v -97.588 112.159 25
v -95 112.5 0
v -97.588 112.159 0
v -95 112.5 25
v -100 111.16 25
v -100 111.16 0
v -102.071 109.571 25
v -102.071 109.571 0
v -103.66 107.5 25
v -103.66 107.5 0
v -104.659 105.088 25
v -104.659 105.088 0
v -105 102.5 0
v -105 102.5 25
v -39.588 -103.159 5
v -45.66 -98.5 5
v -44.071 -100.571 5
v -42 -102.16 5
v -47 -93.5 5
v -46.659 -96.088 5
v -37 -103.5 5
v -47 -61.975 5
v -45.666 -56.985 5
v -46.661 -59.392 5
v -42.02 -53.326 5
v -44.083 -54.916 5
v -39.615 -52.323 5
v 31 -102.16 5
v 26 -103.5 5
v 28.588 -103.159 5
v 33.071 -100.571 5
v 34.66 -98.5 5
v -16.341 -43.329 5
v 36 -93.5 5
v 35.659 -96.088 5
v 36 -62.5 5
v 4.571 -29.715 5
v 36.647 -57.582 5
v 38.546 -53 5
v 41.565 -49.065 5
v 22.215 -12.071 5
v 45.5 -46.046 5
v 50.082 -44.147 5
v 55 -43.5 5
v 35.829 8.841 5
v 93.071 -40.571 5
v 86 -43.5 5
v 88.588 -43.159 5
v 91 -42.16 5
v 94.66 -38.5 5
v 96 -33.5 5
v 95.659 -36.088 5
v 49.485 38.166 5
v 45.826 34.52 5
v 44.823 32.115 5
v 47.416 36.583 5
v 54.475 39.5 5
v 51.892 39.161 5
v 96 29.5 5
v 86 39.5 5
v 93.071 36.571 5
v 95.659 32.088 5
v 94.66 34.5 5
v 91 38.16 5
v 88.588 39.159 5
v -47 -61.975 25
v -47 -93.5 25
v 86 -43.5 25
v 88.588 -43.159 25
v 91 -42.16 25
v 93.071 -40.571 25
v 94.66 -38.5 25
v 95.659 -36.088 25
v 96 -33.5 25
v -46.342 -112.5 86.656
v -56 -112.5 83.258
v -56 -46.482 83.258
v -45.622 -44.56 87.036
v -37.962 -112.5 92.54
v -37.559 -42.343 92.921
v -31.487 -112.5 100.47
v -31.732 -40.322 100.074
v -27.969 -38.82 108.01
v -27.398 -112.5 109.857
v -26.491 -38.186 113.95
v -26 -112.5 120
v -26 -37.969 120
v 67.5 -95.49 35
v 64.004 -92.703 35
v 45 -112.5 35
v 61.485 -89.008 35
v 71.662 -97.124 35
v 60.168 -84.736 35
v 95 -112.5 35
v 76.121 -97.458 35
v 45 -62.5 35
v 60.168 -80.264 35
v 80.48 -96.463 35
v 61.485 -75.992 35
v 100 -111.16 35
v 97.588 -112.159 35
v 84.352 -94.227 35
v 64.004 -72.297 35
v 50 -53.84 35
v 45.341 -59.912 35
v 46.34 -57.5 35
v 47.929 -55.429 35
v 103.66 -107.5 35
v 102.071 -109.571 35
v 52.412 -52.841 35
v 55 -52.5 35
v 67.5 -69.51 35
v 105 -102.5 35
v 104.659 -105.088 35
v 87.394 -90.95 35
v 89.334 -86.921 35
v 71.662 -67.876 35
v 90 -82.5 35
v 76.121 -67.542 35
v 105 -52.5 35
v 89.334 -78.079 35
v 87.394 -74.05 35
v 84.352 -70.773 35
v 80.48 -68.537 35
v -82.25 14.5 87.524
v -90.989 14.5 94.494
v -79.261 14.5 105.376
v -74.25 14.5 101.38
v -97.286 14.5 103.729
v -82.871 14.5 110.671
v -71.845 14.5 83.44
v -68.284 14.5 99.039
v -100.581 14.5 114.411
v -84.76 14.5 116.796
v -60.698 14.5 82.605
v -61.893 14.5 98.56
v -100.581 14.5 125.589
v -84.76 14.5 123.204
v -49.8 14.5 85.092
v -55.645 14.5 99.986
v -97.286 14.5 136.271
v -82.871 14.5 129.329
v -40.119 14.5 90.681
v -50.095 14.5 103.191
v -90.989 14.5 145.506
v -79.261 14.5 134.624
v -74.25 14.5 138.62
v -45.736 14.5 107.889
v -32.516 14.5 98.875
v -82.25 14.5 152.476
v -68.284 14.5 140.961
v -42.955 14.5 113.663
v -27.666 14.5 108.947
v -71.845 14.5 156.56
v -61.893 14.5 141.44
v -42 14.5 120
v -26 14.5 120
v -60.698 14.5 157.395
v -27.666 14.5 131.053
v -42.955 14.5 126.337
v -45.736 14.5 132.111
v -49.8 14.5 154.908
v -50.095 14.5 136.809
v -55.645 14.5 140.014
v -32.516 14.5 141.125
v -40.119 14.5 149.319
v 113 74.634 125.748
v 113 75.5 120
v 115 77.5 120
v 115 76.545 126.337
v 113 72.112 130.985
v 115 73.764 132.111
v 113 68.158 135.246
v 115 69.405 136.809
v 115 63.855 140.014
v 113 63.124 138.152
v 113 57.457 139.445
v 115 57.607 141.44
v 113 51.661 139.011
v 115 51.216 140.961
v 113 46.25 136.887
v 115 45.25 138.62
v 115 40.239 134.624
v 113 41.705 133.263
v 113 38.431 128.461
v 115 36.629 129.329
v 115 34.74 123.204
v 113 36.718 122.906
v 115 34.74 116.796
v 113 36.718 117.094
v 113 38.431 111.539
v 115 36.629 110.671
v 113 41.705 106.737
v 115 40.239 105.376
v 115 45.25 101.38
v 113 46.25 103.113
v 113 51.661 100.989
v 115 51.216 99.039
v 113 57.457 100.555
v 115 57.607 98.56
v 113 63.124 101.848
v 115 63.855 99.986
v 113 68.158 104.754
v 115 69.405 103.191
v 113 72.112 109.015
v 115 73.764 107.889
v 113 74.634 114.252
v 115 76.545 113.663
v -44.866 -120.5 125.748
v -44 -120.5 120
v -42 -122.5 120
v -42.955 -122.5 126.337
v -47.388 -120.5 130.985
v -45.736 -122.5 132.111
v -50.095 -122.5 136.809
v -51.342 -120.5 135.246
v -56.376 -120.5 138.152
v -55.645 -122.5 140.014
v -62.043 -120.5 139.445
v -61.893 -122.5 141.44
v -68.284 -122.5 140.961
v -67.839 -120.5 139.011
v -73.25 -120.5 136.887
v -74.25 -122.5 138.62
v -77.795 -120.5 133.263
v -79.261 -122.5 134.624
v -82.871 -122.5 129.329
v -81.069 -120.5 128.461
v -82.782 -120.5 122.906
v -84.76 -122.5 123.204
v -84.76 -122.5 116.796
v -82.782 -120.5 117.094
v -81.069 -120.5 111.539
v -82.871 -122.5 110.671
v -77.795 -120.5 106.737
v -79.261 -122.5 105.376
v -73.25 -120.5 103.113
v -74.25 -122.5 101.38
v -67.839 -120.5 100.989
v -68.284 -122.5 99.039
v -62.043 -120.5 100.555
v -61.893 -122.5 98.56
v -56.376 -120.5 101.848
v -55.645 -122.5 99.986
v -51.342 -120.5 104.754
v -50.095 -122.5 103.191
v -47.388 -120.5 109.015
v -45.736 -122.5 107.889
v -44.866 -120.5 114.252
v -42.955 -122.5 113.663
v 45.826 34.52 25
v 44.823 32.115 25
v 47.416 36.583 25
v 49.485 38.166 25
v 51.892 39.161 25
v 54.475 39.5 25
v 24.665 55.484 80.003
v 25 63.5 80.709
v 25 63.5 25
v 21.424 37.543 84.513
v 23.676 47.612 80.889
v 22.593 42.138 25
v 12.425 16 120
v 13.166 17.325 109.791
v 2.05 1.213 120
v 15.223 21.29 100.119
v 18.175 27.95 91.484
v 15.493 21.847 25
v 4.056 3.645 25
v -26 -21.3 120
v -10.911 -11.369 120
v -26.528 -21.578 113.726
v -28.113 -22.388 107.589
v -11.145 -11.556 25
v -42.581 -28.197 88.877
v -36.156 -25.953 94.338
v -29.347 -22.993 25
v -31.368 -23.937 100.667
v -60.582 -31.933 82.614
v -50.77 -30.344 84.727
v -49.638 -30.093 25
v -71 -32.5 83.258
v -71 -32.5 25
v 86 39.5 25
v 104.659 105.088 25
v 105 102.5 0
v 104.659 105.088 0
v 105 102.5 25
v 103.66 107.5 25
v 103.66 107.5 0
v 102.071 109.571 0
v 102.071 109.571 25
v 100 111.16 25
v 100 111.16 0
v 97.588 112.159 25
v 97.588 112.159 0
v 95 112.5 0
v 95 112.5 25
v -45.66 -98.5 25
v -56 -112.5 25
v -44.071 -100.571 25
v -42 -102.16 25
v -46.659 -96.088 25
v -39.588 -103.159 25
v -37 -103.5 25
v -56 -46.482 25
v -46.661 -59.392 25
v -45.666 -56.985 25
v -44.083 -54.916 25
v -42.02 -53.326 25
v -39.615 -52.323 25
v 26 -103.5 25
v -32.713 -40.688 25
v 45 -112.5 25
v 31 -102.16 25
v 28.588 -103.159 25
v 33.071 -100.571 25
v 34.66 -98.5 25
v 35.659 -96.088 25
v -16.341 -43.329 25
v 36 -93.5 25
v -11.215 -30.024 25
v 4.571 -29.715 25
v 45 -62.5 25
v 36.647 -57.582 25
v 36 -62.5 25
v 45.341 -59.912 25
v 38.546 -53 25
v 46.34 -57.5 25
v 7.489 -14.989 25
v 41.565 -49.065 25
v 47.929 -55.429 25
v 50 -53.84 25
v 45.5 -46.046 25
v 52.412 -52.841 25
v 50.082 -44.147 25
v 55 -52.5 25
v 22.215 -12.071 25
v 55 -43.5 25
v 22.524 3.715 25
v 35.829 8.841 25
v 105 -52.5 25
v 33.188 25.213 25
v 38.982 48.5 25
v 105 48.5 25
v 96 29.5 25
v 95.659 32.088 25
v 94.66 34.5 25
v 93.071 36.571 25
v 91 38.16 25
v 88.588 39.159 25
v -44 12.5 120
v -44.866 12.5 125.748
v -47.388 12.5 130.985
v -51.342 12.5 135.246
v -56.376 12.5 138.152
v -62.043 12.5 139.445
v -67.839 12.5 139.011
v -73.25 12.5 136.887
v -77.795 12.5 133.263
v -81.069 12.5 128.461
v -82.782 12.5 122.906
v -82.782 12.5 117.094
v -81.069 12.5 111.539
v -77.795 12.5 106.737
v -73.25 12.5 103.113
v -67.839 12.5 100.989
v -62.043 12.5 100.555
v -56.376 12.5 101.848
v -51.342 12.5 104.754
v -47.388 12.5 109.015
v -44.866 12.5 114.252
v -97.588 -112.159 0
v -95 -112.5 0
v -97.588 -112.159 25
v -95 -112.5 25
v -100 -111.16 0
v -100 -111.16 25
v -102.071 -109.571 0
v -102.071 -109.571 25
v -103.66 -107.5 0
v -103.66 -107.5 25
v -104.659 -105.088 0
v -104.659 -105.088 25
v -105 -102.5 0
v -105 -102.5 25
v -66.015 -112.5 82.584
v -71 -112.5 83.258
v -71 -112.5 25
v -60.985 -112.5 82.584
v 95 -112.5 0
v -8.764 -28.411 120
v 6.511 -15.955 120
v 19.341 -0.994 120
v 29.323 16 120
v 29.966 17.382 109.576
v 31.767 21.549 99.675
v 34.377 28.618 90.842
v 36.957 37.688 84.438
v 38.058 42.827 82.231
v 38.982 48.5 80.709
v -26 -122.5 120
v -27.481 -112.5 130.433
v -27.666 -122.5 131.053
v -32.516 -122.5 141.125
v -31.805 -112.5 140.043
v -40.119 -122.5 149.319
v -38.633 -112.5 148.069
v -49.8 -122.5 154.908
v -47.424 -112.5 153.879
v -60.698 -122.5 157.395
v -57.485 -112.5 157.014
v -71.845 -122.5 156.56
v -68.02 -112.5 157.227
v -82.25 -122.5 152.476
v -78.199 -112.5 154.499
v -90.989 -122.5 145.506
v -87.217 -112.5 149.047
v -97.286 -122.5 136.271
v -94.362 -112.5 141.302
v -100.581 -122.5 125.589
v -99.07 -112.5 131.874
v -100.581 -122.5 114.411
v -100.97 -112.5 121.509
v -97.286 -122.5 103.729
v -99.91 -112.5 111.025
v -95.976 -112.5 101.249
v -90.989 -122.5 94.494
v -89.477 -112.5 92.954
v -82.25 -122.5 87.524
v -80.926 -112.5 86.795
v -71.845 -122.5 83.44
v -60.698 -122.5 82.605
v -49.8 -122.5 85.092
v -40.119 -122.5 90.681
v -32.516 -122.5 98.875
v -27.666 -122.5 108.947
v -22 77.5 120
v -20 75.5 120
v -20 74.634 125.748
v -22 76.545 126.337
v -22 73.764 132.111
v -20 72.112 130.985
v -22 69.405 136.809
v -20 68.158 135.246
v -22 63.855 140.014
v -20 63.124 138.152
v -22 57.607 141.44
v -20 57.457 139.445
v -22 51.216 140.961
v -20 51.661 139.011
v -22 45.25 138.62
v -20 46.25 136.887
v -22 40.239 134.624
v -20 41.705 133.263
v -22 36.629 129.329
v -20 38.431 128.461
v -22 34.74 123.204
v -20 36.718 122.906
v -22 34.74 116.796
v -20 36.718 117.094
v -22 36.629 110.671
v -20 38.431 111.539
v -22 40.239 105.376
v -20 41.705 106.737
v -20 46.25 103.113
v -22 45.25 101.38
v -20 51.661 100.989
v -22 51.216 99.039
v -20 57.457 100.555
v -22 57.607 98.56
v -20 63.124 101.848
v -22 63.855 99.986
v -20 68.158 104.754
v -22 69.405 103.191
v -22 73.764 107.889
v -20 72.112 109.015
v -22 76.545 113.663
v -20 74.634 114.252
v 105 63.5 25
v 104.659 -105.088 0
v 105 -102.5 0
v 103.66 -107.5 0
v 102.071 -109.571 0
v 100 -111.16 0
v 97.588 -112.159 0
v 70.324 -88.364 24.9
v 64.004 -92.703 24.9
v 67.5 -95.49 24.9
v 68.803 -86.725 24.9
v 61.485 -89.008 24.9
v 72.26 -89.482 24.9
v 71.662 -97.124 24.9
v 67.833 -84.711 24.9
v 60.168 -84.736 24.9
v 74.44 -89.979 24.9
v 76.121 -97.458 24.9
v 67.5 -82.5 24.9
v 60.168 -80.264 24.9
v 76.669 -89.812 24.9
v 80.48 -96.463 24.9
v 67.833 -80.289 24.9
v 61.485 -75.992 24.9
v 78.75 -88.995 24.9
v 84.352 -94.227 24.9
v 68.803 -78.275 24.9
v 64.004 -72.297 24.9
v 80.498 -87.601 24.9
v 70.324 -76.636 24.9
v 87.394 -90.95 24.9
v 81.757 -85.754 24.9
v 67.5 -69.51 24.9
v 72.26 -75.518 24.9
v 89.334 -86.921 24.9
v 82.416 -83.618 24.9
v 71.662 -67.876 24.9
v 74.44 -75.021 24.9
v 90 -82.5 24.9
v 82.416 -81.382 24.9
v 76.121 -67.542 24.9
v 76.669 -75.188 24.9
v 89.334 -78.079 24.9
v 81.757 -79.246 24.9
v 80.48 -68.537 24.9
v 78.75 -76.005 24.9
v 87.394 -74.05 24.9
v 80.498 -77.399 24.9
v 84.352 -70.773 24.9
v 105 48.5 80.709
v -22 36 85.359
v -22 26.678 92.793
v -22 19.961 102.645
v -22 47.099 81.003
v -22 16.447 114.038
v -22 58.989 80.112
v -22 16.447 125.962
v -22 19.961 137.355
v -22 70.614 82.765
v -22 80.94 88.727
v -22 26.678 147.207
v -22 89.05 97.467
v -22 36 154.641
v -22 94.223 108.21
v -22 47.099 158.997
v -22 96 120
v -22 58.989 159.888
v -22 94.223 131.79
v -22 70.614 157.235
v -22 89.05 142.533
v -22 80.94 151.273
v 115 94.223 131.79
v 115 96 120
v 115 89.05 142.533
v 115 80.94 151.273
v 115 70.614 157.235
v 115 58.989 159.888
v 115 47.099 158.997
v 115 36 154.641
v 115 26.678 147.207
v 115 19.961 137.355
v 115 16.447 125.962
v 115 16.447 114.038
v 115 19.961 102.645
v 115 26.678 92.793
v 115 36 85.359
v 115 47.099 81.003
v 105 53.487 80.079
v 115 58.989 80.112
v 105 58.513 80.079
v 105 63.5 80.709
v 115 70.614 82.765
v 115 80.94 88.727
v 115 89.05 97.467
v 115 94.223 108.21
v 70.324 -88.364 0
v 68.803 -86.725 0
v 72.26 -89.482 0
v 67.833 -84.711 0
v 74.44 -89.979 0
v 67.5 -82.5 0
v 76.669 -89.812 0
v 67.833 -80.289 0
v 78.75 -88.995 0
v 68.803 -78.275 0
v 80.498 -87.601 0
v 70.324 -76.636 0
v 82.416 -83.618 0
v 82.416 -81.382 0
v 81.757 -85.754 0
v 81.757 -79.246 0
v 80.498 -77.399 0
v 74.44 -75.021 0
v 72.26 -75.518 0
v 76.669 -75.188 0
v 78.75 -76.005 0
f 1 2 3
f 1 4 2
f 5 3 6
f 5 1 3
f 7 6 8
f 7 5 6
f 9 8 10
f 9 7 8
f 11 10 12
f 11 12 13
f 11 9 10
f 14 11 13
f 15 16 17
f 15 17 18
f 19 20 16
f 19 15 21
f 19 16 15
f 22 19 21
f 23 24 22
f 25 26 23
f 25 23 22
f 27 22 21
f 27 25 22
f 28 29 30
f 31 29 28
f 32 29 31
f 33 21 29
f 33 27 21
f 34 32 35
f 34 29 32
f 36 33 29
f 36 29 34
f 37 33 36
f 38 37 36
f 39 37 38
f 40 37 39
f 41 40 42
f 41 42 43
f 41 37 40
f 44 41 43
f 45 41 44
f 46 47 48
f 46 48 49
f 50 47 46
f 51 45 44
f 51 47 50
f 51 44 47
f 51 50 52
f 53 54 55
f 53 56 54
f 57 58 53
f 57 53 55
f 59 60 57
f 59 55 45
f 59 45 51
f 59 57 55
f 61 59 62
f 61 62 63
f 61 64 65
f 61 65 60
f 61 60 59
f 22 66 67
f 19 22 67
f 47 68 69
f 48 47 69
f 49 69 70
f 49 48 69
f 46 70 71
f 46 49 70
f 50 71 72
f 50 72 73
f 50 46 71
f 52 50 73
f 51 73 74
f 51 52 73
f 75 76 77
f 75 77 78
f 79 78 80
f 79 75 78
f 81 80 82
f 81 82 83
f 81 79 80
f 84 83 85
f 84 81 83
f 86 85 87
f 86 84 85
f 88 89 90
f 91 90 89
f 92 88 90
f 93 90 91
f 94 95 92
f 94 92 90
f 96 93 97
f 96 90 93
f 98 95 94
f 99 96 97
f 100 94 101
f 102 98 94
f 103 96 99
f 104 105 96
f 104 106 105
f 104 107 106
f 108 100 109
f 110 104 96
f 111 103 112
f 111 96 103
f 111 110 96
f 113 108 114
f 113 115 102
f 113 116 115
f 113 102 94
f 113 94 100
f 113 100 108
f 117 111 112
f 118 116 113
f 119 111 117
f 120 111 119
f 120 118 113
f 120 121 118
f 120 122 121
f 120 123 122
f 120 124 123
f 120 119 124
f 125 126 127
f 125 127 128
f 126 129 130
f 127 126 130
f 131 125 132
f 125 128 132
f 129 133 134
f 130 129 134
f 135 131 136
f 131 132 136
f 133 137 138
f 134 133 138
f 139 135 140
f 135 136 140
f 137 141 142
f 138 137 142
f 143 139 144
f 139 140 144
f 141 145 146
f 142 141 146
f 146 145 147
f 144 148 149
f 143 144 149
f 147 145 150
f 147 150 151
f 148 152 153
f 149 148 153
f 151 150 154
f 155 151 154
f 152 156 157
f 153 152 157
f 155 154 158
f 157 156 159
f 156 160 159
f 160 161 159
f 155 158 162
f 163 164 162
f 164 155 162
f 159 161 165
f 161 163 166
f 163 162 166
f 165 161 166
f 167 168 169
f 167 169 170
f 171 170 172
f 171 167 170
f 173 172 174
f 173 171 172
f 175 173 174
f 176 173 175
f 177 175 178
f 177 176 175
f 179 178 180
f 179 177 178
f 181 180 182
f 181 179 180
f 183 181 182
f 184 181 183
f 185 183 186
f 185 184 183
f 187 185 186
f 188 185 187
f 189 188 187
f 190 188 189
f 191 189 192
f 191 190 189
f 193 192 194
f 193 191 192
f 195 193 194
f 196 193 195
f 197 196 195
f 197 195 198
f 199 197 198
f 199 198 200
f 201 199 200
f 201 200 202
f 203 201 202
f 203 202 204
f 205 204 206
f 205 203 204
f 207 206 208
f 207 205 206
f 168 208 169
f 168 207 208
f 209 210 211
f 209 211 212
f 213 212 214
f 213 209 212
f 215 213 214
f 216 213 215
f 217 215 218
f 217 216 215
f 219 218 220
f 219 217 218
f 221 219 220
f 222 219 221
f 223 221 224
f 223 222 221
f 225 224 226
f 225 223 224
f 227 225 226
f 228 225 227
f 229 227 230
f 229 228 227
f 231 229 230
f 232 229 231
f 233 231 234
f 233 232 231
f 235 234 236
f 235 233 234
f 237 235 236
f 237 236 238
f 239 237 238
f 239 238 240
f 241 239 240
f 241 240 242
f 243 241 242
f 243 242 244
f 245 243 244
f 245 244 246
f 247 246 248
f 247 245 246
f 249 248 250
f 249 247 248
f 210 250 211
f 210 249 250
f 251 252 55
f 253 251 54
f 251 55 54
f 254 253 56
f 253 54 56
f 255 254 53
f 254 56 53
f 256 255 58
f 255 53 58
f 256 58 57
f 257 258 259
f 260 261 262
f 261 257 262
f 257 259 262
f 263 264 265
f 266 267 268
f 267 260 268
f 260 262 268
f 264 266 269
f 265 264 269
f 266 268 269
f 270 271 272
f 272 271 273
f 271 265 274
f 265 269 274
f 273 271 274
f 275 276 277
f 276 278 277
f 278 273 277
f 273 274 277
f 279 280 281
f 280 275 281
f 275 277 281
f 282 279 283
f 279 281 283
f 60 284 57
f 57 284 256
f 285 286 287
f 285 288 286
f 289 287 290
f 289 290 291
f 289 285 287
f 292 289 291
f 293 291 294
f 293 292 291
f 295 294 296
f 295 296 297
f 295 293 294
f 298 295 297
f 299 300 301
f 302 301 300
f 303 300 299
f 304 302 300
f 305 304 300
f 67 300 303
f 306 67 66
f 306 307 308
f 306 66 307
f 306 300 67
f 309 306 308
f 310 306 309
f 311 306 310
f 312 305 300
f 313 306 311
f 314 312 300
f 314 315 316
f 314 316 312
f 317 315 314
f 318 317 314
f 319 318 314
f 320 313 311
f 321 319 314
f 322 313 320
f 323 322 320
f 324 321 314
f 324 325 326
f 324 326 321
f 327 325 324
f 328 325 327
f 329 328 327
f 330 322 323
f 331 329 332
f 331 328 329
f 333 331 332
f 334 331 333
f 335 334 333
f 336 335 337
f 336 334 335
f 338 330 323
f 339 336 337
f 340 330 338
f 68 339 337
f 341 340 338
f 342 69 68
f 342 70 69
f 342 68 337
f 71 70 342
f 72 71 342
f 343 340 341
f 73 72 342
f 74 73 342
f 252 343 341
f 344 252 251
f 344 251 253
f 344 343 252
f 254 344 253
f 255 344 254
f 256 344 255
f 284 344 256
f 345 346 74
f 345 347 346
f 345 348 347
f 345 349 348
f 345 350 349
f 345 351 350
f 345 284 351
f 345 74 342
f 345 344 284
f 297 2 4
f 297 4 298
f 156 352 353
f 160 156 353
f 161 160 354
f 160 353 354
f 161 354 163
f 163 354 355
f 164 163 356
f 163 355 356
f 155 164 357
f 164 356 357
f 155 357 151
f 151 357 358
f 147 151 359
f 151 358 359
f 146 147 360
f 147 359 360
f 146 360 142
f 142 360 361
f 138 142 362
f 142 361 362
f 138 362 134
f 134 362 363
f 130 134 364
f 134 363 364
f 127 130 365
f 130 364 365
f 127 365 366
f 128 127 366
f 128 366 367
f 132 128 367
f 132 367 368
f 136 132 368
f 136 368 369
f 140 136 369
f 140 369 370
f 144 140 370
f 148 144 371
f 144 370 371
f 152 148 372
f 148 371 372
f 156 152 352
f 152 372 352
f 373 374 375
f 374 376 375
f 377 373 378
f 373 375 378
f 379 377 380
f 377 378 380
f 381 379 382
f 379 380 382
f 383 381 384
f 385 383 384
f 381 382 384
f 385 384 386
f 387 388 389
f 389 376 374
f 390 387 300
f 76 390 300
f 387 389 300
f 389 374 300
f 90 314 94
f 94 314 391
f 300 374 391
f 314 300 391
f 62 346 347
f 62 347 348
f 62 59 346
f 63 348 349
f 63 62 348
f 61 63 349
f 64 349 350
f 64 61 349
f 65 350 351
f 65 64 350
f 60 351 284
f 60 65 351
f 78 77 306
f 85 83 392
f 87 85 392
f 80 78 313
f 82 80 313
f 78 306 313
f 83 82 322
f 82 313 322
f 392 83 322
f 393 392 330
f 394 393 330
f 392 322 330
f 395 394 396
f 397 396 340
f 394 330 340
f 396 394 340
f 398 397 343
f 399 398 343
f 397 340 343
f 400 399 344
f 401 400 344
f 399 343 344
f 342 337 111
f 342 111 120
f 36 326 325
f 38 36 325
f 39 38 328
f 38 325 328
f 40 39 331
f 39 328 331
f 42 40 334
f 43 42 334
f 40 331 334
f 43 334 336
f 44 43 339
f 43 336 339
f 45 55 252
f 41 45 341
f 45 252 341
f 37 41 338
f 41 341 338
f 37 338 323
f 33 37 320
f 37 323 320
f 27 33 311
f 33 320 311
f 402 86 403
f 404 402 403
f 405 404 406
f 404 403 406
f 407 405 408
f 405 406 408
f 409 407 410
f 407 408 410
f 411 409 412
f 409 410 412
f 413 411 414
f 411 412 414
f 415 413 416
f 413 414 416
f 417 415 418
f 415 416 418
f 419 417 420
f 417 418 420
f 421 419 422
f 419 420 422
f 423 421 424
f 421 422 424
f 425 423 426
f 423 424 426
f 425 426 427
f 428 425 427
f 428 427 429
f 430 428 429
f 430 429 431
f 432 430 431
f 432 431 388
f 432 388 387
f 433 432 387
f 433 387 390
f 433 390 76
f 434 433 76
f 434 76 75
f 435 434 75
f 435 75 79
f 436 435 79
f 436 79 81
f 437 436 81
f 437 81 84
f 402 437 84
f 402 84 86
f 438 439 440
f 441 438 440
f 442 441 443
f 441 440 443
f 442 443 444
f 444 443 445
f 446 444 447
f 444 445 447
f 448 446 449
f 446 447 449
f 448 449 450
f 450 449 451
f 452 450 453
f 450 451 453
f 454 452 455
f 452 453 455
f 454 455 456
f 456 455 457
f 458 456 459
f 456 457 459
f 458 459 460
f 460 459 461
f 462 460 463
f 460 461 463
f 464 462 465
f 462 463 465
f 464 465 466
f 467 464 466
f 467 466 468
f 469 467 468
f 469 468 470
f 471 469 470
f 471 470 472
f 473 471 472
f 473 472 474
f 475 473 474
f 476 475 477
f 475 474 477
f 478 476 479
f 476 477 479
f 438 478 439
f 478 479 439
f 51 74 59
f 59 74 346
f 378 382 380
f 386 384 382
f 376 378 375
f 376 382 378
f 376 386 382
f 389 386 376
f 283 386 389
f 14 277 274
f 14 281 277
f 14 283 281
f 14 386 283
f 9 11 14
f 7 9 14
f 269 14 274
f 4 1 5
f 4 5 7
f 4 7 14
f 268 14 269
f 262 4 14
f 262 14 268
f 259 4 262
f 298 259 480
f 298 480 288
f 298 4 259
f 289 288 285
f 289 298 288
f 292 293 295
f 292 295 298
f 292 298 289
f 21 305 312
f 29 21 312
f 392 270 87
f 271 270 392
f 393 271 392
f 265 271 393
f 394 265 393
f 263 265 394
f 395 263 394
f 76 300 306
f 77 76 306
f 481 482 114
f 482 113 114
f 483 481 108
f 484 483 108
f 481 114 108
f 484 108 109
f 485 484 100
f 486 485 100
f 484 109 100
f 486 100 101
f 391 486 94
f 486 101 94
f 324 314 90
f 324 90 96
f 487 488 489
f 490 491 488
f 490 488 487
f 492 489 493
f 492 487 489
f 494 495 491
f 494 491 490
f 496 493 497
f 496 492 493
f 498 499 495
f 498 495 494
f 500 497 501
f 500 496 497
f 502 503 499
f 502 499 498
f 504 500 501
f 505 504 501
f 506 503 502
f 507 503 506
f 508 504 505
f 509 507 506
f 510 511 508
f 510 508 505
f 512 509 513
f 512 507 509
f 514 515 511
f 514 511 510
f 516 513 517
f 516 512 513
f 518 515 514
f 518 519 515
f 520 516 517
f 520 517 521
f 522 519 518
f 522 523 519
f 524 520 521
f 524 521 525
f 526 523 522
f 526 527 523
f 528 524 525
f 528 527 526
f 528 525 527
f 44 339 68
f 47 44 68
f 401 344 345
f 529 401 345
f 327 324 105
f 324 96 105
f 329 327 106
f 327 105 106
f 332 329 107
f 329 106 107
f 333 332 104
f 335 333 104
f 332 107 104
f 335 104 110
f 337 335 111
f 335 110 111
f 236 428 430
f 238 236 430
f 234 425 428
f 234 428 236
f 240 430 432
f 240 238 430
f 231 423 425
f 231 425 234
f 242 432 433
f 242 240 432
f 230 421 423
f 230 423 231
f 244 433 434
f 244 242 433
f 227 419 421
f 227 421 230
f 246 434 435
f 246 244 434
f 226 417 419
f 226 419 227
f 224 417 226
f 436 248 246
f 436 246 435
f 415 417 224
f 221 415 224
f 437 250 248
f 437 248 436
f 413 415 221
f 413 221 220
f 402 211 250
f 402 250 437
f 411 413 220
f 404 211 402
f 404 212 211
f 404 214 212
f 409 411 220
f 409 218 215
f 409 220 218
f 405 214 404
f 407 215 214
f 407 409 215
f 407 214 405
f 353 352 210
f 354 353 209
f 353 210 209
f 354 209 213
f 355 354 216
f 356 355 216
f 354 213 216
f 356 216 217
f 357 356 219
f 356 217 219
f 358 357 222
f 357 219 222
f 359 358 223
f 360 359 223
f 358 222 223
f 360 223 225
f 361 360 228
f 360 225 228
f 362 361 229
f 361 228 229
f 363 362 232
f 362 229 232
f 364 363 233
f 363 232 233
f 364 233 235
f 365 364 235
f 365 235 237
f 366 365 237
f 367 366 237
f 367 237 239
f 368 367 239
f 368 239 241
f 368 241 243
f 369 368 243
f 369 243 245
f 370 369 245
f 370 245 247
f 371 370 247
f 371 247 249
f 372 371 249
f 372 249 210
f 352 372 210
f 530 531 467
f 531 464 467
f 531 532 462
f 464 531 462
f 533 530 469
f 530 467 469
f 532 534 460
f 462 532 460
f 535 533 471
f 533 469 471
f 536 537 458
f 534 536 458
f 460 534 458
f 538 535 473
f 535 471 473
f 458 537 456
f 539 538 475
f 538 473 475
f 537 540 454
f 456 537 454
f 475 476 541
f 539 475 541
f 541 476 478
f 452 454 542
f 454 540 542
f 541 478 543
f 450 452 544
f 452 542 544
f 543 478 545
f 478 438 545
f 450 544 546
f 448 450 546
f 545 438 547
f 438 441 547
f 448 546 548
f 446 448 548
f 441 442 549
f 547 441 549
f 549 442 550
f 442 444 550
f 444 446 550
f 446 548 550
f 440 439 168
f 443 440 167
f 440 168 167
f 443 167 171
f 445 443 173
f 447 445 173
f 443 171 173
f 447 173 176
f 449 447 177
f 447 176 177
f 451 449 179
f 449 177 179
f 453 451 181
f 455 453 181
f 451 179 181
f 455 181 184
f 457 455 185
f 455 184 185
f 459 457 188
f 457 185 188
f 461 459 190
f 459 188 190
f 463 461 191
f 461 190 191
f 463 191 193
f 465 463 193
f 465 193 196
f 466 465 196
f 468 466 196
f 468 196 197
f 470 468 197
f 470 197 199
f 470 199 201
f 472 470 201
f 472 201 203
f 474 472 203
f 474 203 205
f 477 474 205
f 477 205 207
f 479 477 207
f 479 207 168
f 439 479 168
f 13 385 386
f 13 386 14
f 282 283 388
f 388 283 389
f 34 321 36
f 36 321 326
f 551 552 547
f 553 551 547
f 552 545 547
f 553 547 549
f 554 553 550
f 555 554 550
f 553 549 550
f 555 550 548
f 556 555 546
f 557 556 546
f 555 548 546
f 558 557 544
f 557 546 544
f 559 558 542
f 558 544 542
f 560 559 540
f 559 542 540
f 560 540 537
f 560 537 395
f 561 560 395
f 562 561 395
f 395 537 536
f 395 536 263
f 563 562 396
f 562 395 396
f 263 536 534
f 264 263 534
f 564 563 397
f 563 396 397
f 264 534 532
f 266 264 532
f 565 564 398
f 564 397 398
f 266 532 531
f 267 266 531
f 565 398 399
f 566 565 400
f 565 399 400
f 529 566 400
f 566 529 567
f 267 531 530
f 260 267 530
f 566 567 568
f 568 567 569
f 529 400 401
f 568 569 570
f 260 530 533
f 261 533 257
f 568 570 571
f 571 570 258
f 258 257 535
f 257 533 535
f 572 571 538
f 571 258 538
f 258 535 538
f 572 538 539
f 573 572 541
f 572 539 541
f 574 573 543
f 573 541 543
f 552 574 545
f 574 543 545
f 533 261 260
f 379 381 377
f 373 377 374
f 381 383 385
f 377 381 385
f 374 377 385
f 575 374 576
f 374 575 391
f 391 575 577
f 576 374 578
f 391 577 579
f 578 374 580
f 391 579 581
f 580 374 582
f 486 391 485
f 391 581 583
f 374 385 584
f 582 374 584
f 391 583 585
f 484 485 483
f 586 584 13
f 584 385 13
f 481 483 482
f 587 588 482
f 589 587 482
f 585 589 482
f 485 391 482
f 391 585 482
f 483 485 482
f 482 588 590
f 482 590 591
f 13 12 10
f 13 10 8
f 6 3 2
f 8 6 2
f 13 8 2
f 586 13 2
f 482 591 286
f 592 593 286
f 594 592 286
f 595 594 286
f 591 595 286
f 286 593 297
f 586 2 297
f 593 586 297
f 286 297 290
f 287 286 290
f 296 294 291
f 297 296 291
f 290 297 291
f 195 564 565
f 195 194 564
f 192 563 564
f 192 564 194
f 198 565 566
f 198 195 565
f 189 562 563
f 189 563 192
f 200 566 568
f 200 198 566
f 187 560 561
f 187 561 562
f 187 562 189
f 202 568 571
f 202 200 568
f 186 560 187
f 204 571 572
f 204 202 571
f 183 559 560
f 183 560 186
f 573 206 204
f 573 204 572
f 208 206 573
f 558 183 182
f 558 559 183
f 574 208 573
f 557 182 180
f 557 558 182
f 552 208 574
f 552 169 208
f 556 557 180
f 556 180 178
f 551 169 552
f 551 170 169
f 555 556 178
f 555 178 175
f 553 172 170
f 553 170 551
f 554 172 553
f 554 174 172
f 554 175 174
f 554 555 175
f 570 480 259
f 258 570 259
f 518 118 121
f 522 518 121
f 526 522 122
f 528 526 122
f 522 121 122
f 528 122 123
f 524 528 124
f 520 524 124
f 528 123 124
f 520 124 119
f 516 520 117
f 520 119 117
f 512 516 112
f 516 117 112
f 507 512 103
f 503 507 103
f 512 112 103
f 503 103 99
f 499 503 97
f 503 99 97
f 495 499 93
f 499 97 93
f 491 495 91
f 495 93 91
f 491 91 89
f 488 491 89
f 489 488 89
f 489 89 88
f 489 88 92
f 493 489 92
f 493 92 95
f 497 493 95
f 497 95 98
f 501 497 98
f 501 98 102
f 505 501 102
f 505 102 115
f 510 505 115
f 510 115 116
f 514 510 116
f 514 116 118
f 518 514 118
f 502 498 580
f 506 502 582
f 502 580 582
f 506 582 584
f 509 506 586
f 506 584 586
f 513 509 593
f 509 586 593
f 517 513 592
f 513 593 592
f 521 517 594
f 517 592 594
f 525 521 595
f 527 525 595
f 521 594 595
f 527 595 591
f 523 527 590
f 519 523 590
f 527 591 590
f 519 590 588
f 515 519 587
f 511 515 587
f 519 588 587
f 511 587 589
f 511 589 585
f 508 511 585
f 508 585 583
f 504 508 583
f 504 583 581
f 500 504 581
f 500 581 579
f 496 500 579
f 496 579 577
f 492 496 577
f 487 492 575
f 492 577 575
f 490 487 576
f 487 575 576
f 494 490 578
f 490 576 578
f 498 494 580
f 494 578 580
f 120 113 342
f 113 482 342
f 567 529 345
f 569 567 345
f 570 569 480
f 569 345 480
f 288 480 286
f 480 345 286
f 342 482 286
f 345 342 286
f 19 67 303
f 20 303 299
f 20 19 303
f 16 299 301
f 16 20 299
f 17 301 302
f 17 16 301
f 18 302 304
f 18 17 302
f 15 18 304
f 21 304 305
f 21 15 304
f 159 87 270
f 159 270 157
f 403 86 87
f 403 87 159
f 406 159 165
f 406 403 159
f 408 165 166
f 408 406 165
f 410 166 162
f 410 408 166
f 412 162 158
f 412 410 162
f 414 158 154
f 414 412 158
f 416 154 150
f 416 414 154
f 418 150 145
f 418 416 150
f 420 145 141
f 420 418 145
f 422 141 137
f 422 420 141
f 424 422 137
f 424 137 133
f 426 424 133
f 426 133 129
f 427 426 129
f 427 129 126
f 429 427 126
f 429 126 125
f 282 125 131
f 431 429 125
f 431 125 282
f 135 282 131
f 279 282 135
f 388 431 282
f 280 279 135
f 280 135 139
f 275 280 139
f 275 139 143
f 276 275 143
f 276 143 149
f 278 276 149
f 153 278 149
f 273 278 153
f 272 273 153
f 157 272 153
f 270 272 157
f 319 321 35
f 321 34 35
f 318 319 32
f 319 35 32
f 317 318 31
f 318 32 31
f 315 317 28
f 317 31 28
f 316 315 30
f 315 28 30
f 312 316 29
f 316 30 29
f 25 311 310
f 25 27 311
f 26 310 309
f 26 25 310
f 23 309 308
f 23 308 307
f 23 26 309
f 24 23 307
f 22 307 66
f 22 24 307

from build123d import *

# Parameters (mm, degrees)
F0_W            = 210
F0_H            = 225
F1_DEPTH        = 25
F3_DEPTH        = 95
F4_R            = 37.5
F5_DEPTH        = 10
F5_DEPTH_BACK   = 127
F6_R            = 40
F7_DEPTH        = 10
F7_DEPTH_BACK   = 127
F8_W            = 60
F8_H            = 60
F9_DEPTH        = 10
F10_R           = 10
F12_DEPTH       = 20
F14_D           = 15
F14_CBORE_D     = 30
F14_CBORE_DEPTH = 10.1
F15_R           = 10
F16_R           = 10
F17_R           = 19.5
F18_DEPTH       = 235.001
F19_R           = 19.5
F20_DEPTH       = 220.001
F21_SIZE        = 2
F22_R           = 10


with BuildPart() as f1:
    # F0 (on Top) → F1 (new body)
    with BuildSketch(Plane.XY):
        Rectangle(F0_W, F0_H)
    extrude(amount=F1_DEPTH)

    # F2 (on face) → F3 (join)
    with BuildSketch(Plane.XY.offset(25)):
        with BuildLine():
            Line((-71, -32.5), (-71, -112.5))
            Line((-71, -112.5), (-56.000001, -112.5))
            Line((-56.000001, -112.5), (-56.000001, -46.481815))
            ThreePointArc((-56.000001, -46.481815), (7.488852, -14.988852), (38.981815, 48.500001))
            Line((38.981815, 48.500001), (105, 48.500001))
            Line((105, 48.500001), (105, 63.5))
            Line((105, 63.5), (25, 63.5))
            ThreePointArc((25, 63.5), (-3.117749, -4.382251), (-71, -32.5))
        make_face()
    extrude(amount=F3_DEPTH)

    # F4 (on face) → F5 (join, two sides)
    with BuildSketch(Plane.XZ.offset(112.5)) as f5_sk:
        with Locations((-63.500001, 120)):
            Circle(F4_R)
    extrude(amount=F5_DEPTH)
    extrude(f5_sk.sketch, amount=-F5_DEPTH_BACK)

    # F6 (on face) → F7 (join, two sides)
    with BuildSketch(Plane.YZ.offset(105)) as f7_sk:
        with Locations((56.000001, 120)):
            Circle(F6_R)
    extrude(amount=F7_DEPTH)
    extrude(f7_sk.sketch, amount=-F7_DEPTH_BACK)

    # F8 (on face) → F9 (join)
    with BuildSketch(Plane.XY.offset(25)):
        with Locations((75, -82.5)):
            Rectangle(F8_W, F8_H)
    extrude(amount=F9_DEPTH)

    # F10
    f10_edges = [f1.edges().sort_by_distance(p)[0] for p in [
        (45, -52.5, 30),
    ]]
    fillet(f10_edges, radius=F10_R)

    # F11 (on face) → F12 (cut)
    with BuildSketch(Plane.XY.offset(25)):
        with BuildLine():
            ThreePointArc((46.575506, 39.500003), (13.852812, -21.352812), (-47.000003, -54.075506))
            Line((-47.000003, -54.075506), (-47.000003, -103.500001))
            Line((-47.000003, -103.500001), (36.000001, -103.500001))
            Line((36.000001, -103.500001), (36.000001, -62.5))
            ThreePointArc((36.000001, -62.5), (41.564972, -49.064972), (55, -43.500001))
            Line((55, -43.500001), (96.000001, -43.500001))
            Line((96.000001, -43.500001), (96.000001, 39.500003))
            Line((96.000001, 39.500003), (46.575506, 39.500003))
        make_face()
    extrude(amount=-F12_DEPTH, mode=Mode.SUBTRACT)

    # F14 (through all)
    with Locations(Plane.XY.offset(35)):
        with Locations((75, -82.5)):
            CounterBoreHole(F14_D / 2, F14_CBORE_D / 2, F14_CBORE_DEPTH)

    # F15
    f15_edges = [f1.edges().sort_by_distance(p)[0] for p in [
        (-47.000003, -54.075506, 15),
        (46.575506, 39.500003, 15),
        (-47.000003, -103.500001, 15),
        (96.000001, 39.500003, 15),
    ]]
    fillet(f15_edges, radius=F15_R)

    # F16
    f16_edges = [f1.edges().sort_by_distance(p)[0] for p in [
        (96.000001, -43.500001, 15),
        (36.000001, -103.500001, 15),
    ]]
    fillet(f16_edges, radius=F16_R)

    # F17 (on face) → F18 (cut, through all)
    with BuildSketch(Plane.XZ.offset(122.5)):
        with Locations((-63.500001, 120)):
            Circle(F17_R)
    extrude(amount=-F18_DEPTH, mode=Mode.SUBTRACT)

    # F19 (on face) → F20 (cut, through all)
    with BuildSketch(Plane.YZ.offset(115)):
        with Locations((56.000001, 120)):
            Circle(F19_R)
    extrude(amount=-F20_DEPTH, mode=Mode.SUBTRACT)

    # F21
    f21_edges = [f1.edges().sort_by_distance(p)[0] for p in [
        (115, 36.500001, 120),
        (-83.000001, -122.5, 120),
        (-22, 36.500001, 120),
        (-83.000001, 14.5, 120),
    ]]
    chamfer(f21_edges, length=F21_SIZE)

    # F22
    f22_edges = [f1.edges().sort_by_distance(p)[0] for p in [
        (-105, -112.5, 12.5),
        (105, -112.5, 17.5),
        (105, 112.5, 12.5),
        (-105, 112.5, 12.5),
    ]]
    fillet(f22_edges, radius=F22_R)


solid = f1.part
